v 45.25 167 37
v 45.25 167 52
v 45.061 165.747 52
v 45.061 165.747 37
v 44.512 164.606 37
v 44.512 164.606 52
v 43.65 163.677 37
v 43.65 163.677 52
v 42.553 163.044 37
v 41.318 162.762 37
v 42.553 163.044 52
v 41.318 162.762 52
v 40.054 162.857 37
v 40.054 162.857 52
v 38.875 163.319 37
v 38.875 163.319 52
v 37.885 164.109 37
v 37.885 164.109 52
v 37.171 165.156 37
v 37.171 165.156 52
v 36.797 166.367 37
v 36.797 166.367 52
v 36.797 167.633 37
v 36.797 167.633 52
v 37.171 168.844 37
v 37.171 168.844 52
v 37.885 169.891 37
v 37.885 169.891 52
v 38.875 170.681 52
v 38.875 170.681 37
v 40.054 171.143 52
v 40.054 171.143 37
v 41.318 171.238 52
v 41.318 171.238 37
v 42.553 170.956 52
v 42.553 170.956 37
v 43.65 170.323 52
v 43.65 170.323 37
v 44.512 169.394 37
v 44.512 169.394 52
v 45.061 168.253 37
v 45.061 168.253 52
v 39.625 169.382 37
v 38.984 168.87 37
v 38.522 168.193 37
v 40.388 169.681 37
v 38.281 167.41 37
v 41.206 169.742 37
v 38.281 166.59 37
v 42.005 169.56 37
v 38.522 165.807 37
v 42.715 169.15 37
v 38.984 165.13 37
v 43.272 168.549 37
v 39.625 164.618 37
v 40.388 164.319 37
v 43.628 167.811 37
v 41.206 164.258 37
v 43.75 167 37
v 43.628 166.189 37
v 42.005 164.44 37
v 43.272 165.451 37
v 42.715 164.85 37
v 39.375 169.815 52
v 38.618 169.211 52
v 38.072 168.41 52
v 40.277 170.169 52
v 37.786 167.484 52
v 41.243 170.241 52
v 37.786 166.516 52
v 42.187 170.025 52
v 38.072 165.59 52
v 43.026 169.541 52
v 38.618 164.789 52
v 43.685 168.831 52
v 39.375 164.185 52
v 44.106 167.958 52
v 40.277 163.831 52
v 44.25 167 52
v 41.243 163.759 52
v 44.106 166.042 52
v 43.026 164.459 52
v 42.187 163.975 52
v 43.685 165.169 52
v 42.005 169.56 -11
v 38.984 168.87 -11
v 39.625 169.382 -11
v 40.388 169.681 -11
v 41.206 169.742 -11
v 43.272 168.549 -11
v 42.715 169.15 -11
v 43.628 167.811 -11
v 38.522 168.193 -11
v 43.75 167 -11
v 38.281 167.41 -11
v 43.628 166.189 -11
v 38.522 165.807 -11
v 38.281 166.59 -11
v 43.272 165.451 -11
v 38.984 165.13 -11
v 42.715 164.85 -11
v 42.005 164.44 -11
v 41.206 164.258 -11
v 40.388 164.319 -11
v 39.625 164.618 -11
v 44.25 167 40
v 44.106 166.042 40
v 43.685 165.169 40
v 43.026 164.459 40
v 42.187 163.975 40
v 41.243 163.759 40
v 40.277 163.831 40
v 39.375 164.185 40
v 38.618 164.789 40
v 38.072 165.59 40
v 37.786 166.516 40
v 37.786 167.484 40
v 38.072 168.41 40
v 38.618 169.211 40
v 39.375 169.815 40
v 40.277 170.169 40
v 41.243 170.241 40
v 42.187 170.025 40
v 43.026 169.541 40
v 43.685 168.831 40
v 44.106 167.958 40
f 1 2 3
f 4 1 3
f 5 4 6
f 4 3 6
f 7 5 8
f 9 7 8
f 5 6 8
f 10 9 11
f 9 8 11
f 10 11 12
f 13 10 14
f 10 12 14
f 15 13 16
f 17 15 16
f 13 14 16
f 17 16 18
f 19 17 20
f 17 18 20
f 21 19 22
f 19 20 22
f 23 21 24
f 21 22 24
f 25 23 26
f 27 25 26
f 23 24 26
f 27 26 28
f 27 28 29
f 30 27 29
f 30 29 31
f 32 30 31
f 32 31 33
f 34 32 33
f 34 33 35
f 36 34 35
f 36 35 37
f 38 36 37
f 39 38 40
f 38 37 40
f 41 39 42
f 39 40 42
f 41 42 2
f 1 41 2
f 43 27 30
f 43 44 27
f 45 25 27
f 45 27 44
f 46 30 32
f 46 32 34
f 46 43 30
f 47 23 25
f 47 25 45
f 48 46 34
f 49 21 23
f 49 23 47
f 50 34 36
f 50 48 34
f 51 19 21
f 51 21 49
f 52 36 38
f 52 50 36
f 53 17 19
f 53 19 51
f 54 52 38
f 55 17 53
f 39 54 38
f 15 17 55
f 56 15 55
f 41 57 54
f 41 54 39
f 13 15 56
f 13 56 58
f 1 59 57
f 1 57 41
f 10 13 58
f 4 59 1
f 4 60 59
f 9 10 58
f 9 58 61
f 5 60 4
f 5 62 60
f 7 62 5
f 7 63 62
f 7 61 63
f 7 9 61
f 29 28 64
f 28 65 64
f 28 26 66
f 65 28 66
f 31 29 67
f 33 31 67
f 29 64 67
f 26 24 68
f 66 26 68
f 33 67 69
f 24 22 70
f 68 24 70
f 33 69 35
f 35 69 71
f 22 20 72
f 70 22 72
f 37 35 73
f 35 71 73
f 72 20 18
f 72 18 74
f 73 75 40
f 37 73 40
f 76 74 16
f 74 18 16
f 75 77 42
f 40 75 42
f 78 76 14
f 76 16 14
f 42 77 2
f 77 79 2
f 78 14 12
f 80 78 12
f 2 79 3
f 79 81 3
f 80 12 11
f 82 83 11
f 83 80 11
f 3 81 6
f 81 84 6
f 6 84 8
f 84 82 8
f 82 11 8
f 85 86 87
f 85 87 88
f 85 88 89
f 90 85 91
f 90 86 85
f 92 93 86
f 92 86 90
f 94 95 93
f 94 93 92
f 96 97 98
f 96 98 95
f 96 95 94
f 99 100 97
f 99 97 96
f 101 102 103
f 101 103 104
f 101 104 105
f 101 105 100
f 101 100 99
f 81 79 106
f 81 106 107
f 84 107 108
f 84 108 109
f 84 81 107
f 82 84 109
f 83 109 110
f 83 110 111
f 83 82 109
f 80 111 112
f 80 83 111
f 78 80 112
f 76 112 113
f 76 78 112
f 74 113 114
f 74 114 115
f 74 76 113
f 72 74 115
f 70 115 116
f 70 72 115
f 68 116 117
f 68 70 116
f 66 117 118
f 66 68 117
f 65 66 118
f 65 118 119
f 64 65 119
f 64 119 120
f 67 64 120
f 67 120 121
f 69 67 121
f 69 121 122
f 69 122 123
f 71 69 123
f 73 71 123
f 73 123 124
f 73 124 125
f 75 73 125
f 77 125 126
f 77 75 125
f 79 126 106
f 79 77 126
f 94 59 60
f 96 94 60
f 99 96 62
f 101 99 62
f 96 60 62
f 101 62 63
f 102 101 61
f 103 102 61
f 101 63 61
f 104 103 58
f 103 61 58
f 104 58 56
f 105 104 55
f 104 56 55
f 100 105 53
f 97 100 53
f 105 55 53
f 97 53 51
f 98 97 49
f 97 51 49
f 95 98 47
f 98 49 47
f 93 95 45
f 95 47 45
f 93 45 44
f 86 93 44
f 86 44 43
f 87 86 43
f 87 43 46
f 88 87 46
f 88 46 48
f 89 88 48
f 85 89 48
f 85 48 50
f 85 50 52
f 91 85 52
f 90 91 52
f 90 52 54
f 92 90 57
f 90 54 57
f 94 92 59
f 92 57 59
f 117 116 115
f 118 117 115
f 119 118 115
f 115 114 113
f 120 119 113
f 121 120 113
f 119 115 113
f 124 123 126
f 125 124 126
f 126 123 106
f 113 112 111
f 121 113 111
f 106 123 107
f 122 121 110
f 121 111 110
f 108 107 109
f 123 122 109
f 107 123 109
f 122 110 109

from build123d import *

# Parameters (mm, degrees)
CYLINDER016_R             = 3.25
CYLINDER016_DEPTH         = 12
CYLINDER015_R             = 4.25
CYLINDER015_DEPTH         = 15
CYLINDER017_R             = 2.75
CYLINDER017_DEPTH         = 48
FUSION004_PLACEMENT_ANGLE = 180


with BuildPart() as taladro001:
    # Cylinder016 → Cylinder016 (new body)
    with BuildSketch(Plane.XY):
        Circle(CYLINDER016_R)
    extrude(amount=CYLINDER016_DEPTH)


with BuildPart() as cilindro_exterior001:
    # Cylinder015 → Cylinder015 (new body)
    with BuildSketch(Plane.XY):
        Circle(CYLINDER015_R)
    extrude(amount=CYLINDER015_DEPTH)

    # Cut005: cut taladro001
    add(taladro001.part, mode=Mode.SUBTRACT)


with BuildPart() as fusion004:
    # Cylinder017 → Cylinder017 (new body)
    with BuildSketch(Plane.XY.offset(15)):
        Circle(CYLINDER017_R)
    extrude(amount=CYLINDER017_DEPTH)

    # Fusion004: union Cilindro exterior001
    add(cilindro_exterior001.part)


with BuildPart() as fusion004_1:
    # Fusion004 placement: moved
    add(fusion004.part.moved(Location((41, 167, 52))).rotate(Axis((41, 167, 52), (1, 0, 0)), FUSION004_PLACEMENT_ANGLE))


solid = fusion004_1.part
